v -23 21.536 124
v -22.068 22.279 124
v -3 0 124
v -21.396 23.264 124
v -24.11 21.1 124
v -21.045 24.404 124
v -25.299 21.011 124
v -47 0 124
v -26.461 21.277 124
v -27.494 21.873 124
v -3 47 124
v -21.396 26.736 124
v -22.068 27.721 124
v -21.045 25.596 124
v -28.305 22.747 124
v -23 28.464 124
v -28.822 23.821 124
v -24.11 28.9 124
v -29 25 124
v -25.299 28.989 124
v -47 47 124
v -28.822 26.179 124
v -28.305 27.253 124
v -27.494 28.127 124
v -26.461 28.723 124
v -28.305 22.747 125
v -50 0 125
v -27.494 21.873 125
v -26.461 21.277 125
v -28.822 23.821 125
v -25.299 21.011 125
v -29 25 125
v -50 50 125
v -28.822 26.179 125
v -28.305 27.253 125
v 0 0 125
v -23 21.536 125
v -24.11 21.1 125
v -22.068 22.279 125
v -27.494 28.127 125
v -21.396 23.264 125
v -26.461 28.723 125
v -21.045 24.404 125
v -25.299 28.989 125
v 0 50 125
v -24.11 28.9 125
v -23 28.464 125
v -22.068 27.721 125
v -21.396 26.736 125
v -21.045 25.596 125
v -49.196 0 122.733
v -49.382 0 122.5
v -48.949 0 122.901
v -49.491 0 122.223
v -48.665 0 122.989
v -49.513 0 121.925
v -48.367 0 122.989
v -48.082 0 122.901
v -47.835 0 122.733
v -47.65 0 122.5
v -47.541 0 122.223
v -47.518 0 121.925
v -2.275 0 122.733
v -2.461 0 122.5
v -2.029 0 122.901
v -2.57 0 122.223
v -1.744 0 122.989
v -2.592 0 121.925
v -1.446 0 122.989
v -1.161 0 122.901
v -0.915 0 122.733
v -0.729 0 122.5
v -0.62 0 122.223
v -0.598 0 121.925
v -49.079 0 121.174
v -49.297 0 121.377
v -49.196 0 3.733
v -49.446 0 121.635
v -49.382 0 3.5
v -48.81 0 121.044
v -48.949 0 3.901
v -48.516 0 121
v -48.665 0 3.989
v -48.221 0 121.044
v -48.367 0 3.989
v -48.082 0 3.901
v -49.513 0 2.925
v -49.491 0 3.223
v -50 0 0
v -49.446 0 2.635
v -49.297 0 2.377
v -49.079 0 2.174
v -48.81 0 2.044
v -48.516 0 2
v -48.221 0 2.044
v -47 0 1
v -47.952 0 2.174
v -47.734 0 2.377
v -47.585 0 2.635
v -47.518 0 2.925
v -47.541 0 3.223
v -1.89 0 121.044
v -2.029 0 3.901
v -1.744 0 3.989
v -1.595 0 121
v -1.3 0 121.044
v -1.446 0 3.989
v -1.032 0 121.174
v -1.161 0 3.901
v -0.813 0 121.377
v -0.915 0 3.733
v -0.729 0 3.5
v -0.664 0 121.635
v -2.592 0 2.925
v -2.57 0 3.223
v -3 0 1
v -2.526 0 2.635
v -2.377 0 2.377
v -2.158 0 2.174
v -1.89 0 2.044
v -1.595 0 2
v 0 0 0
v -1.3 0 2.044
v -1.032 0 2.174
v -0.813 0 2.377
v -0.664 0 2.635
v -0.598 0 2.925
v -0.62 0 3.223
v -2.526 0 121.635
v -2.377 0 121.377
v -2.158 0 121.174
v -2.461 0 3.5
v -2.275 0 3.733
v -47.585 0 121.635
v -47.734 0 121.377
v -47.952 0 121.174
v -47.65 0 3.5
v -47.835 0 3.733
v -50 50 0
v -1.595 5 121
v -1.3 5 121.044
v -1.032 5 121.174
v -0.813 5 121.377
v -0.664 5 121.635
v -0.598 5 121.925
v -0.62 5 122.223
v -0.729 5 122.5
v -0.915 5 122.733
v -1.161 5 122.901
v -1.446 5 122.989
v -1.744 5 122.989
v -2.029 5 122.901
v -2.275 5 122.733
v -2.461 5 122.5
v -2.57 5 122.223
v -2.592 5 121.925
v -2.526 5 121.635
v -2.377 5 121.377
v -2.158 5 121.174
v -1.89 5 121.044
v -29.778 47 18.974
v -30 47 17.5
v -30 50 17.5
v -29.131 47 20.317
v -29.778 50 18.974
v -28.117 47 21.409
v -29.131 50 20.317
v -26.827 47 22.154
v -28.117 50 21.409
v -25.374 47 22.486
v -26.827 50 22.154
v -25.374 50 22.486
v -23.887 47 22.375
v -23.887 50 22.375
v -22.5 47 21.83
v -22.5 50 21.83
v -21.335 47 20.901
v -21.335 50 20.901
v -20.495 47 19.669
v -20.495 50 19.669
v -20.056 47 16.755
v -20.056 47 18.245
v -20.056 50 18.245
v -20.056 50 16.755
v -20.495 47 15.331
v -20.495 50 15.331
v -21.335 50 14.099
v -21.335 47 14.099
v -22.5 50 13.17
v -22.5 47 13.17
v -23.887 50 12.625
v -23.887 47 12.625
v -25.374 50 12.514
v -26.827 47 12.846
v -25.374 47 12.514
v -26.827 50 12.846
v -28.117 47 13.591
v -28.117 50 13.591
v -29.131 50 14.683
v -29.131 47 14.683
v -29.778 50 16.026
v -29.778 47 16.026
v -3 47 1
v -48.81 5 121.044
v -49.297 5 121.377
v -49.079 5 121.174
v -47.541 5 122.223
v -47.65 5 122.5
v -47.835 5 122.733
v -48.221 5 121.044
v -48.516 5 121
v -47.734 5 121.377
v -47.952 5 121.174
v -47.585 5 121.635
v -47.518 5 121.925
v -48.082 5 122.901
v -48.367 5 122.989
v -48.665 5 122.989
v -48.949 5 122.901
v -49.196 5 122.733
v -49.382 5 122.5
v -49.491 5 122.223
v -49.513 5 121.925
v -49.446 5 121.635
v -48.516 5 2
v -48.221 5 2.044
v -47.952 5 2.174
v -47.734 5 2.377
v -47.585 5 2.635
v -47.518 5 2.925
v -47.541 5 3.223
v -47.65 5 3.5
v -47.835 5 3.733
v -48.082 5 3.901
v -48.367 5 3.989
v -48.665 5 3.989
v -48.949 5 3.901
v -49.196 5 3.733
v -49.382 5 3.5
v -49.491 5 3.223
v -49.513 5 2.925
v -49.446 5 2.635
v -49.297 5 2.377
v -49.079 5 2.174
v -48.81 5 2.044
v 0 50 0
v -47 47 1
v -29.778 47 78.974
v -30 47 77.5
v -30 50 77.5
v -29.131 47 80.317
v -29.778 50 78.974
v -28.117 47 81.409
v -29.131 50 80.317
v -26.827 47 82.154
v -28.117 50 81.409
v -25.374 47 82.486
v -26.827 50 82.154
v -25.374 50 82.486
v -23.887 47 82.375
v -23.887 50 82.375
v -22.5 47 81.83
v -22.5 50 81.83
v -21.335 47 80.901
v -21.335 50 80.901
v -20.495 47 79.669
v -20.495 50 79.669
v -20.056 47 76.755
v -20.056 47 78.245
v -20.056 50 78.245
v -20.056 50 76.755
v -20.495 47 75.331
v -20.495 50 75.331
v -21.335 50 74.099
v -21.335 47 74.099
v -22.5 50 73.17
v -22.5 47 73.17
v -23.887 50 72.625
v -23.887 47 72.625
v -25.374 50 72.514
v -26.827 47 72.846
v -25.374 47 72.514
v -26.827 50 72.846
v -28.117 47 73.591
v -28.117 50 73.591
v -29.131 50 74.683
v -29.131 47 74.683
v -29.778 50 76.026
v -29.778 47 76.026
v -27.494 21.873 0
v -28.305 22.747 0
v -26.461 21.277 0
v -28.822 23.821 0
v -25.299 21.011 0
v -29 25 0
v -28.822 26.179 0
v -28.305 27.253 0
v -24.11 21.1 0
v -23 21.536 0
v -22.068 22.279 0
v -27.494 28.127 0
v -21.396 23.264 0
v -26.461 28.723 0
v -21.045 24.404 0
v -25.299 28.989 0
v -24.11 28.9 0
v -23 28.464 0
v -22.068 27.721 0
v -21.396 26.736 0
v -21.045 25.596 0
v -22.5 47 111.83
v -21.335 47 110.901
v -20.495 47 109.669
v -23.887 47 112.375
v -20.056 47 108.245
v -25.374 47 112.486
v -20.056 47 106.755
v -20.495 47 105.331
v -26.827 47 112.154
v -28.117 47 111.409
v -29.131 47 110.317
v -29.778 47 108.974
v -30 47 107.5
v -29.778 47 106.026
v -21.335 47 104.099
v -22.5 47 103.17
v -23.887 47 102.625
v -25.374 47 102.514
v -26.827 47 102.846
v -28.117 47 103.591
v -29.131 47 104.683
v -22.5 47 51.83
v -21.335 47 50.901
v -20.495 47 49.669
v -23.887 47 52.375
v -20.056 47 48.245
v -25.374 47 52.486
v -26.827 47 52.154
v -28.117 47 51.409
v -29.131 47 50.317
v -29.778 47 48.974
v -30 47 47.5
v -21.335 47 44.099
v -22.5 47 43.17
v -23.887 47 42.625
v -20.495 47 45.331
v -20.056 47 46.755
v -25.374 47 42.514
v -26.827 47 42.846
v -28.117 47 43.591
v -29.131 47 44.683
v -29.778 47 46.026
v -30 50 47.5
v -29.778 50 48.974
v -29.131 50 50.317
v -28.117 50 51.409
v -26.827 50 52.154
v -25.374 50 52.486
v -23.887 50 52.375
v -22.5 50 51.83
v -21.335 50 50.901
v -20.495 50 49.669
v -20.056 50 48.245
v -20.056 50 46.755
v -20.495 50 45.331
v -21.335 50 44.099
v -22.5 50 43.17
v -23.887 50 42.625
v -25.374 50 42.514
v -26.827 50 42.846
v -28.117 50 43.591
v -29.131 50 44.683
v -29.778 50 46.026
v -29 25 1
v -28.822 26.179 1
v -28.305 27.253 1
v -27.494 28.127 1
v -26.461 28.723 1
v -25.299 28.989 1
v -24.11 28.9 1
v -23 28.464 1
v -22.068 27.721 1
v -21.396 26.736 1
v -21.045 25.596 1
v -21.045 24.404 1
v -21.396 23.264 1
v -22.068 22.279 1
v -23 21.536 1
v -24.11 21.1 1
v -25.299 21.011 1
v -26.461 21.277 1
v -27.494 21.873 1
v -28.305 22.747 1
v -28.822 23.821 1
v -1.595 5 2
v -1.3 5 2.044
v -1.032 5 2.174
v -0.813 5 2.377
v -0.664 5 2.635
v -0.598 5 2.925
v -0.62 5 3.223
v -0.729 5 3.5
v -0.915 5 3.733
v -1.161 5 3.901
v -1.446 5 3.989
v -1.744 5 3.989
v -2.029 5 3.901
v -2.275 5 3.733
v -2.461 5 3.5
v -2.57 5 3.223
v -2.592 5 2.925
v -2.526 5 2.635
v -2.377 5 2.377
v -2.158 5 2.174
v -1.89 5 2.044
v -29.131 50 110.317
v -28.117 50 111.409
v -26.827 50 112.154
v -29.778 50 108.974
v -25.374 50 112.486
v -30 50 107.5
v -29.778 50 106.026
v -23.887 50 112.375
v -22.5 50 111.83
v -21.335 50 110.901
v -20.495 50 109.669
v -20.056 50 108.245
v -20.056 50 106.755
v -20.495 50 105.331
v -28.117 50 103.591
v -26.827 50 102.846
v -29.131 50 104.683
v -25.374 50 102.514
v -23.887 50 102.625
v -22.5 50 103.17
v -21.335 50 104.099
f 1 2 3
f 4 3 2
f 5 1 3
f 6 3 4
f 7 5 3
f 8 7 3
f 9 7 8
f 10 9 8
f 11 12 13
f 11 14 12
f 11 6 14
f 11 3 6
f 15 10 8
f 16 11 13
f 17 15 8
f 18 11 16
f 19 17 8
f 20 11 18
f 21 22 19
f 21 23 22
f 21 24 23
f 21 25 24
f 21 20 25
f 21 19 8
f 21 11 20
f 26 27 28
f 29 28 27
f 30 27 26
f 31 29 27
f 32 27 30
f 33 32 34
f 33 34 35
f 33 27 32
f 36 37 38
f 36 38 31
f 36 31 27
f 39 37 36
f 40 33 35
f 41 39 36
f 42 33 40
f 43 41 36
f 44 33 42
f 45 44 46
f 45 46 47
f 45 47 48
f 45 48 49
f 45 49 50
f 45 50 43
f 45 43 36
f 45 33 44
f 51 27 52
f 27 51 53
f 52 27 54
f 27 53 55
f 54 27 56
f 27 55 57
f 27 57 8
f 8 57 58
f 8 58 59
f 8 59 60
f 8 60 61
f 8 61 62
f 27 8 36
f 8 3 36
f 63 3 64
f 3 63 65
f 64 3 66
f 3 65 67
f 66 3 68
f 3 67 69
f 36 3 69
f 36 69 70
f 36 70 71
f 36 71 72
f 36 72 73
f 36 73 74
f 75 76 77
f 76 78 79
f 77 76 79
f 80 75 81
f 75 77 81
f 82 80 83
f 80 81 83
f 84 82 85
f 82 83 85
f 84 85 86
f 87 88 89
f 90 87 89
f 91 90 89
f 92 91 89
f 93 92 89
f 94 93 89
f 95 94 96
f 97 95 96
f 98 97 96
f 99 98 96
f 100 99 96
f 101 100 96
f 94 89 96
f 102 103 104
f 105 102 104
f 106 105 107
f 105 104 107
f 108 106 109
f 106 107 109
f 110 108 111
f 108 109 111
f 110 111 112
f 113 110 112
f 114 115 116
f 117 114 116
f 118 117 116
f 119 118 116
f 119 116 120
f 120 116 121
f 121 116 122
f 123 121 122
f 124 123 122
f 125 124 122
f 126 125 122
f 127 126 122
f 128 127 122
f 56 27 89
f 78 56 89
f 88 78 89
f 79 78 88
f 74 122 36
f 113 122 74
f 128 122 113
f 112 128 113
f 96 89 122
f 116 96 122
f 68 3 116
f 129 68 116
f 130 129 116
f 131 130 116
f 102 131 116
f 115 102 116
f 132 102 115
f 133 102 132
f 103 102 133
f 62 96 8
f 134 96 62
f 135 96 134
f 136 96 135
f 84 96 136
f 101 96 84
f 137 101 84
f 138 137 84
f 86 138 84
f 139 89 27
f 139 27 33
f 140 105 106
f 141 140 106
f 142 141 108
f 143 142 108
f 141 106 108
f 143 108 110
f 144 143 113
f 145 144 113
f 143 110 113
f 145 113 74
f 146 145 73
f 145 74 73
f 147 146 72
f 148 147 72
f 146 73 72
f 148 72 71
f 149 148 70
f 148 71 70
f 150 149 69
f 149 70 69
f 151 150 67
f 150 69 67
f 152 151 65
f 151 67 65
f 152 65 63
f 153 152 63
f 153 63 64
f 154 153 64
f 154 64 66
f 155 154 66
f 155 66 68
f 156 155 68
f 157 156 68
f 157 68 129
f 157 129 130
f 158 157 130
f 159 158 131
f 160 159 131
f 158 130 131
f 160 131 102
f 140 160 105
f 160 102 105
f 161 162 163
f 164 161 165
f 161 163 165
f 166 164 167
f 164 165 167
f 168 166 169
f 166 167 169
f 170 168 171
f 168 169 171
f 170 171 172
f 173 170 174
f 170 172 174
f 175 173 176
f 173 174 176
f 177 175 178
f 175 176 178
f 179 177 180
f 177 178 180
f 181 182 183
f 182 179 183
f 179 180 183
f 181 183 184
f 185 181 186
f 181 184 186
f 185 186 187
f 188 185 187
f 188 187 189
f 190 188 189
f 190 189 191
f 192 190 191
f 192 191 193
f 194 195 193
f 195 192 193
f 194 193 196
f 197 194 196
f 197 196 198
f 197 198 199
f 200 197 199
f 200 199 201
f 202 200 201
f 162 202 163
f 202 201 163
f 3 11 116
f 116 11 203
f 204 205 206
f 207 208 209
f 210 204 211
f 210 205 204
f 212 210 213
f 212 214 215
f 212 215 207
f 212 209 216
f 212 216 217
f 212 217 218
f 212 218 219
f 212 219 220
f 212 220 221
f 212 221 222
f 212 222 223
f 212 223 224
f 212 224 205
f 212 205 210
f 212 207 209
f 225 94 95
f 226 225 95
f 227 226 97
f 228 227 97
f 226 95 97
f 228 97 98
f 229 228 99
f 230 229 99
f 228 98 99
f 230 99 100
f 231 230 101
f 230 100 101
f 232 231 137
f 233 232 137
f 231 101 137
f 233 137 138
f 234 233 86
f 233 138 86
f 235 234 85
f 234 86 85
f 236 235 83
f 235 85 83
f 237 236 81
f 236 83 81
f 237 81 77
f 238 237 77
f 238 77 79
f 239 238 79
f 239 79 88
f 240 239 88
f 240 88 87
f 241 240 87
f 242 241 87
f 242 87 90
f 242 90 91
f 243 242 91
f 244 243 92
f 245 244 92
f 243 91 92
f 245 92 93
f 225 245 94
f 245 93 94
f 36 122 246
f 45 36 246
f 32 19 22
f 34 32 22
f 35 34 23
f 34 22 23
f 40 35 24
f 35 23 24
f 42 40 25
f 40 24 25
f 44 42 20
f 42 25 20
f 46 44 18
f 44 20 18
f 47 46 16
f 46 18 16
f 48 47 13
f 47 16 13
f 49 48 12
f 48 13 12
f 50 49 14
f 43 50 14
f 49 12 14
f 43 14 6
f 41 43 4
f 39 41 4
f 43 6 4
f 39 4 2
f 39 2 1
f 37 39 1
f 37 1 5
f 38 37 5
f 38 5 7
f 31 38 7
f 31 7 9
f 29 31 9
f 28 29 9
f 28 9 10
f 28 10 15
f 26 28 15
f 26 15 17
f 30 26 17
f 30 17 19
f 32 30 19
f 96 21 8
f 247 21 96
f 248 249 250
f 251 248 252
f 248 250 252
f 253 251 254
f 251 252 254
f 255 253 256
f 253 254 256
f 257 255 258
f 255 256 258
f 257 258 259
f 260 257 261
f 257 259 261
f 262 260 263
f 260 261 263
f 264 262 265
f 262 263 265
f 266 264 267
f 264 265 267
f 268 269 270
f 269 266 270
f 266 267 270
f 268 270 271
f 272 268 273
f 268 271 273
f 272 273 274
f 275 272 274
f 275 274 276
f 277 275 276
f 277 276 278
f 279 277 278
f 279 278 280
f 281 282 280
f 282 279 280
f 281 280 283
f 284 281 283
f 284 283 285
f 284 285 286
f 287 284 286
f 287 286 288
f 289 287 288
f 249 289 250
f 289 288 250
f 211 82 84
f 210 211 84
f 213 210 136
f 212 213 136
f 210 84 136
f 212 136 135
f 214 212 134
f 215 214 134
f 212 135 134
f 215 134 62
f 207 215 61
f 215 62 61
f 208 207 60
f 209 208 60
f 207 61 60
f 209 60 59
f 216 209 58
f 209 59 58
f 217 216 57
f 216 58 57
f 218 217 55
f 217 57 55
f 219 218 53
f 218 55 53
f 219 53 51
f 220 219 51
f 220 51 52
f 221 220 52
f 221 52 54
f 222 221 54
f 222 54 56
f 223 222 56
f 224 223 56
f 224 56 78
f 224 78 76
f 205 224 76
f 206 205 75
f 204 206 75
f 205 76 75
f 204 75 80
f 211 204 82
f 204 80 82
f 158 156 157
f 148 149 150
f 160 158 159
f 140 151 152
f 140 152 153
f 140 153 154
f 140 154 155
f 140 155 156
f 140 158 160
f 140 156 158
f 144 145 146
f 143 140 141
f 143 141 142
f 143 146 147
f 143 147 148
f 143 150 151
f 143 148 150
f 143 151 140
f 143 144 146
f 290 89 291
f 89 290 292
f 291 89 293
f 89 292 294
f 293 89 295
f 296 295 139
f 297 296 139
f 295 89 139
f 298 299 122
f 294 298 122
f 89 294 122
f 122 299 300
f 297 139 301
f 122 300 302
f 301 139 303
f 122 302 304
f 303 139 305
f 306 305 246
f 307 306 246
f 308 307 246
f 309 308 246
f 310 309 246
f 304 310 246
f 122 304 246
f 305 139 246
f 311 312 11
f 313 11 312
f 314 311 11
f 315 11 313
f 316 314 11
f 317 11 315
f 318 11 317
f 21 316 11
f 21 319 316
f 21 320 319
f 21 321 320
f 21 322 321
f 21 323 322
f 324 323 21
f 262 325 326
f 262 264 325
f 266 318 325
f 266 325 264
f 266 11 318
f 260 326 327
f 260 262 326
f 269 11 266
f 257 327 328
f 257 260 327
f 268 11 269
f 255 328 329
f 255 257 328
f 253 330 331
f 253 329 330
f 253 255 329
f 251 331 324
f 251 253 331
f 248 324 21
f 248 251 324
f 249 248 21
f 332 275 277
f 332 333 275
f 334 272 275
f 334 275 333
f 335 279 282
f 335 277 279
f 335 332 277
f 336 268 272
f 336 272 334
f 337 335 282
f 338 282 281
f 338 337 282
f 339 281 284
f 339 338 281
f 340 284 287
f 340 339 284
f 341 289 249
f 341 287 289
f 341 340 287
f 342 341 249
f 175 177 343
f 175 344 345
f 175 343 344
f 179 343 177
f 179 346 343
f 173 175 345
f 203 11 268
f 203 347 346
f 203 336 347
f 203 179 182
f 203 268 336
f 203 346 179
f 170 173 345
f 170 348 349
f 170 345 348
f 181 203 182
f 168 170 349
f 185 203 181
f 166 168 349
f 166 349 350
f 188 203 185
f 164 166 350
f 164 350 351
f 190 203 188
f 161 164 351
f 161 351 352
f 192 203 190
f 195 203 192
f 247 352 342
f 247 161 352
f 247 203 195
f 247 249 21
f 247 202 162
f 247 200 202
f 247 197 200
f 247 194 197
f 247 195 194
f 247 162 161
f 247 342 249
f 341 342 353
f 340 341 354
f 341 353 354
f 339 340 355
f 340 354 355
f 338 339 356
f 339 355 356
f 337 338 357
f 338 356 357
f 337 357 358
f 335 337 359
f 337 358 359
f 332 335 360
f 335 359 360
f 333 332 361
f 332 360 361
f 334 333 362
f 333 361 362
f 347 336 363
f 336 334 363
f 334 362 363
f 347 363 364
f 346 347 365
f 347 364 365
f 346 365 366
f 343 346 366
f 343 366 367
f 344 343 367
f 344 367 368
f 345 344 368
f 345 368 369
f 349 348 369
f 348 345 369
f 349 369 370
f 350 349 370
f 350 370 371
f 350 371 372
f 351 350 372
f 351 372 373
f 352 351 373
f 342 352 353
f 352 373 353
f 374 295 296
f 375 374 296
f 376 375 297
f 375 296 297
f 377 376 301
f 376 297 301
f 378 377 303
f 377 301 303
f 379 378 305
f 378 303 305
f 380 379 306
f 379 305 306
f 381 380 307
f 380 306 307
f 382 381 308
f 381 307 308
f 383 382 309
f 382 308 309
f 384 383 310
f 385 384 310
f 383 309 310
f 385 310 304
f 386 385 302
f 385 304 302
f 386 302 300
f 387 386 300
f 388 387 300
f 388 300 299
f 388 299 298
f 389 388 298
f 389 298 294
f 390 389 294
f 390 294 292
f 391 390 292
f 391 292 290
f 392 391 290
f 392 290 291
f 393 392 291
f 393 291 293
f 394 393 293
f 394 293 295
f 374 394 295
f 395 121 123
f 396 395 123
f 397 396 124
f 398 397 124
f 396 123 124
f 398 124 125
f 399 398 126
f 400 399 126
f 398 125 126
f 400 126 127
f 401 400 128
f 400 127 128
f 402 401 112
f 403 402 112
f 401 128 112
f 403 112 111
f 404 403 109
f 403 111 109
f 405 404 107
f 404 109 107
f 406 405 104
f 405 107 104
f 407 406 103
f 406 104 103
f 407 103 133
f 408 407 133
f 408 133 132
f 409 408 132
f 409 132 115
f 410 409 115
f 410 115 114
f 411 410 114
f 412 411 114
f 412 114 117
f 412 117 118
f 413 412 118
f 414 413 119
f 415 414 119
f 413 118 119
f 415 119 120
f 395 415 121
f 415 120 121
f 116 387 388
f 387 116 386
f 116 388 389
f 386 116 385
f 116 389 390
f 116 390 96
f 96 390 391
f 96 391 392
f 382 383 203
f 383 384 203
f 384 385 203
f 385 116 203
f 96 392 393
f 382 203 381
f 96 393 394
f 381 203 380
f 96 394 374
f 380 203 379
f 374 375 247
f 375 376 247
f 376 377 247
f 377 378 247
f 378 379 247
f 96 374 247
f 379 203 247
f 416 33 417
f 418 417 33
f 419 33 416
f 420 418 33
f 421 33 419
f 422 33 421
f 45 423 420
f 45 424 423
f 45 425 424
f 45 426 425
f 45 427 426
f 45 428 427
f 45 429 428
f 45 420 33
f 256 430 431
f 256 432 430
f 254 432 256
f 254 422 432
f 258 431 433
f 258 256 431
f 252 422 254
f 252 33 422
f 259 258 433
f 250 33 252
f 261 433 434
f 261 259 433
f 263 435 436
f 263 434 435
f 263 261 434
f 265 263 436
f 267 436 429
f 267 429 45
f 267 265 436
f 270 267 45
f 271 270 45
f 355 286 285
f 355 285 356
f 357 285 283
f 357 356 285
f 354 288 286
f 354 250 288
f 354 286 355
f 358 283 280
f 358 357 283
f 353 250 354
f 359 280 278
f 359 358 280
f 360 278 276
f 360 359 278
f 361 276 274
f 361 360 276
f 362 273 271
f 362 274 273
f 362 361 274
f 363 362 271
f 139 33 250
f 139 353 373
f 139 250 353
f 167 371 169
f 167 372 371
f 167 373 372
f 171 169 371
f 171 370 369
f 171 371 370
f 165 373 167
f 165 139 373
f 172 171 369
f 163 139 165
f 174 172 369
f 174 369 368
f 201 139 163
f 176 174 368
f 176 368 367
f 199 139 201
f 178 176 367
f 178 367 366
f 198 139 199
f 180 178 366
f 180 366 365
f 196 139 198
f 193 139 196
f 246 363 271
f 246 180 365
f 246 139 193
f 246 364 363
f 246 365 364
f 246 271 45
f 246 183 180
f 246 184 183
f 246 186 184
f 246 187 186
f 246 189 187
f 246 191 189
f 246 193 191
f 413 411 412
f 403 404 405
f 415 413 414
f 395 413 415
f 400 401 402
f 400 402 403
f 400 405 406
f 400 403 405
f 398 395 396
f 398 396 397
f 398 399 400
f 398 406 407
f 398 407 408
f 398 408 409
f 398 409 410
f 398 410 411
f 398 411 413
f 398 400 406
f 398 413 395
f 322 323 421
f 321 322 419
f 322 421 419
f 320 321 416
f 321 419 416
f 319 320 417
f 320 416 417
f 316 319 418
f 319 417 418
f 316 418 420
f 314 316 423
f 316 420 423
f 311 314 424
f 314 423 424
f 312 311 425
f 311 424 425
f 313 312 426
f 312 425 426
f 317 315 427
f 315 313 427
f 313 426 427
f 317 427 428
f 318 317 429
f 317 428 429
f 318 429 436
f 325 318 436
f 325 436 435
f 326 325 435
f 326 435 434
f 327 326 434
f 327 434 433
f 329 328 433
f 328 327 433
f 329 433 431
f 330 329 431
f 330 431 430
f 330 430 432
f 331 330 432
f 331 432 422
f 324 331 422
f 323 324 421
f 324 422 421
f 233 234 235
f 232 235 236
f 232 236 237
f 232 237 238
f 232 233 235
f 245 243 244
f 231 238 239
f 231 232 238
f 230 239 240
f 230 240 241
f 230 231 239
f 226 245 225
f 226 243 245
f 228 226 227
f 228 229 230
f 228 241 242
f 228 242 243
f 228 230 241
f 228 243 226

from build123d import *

# Parameters (mm, degrees)
SKETCH1_W           = 50
SKETCH1_H           = 50
BOSS_EXTRUDE1_DEPTH = 125
SKETCH2_R           = 5
CUT_EXTRUDE1_DEPTH  = 145
SKETCH3_R           = 4
CUT_EXTRUDE2_DEPTH  = 145
CUT_EXTRUDE3_START  = -47
SKETCH4_W           = 44
SKETCH4_H           = 123
SKETCH4_R           = 5
CUT_EXTRUDE3_DEPTH  = 47
SKETCH5_R           = 1
CUT_EXTRUDE4_DEPTH  = 5


with BuildPart() as part:
    # Sketch1 → Boss-Extrude1 (new body)
    with BuildSketch(Plane.XY):
        with Locations((-25, 25)):
            Rectangle(SKETCH1_W, SKETCH1_H)
    extrude(amount=BOSS_EXTRUDE1_DEPTH)

    # Sketch2 → Cut-Extrude1 (cut)
    with BuildSketch(Plane(origin=(0, 50, 0), x_dir=(1, 0, 0), z_dir=(0, 1, 0))):
        with Locations(Location((-25, -17.5, 0), (0, 0, 180))):
            Circle(SKETCH2_R)
        with Locations(Location((-25, -47.5, 0), (0, 0, 180))):
            Circle(SKETCH2_R)
        with Locations(Location((-25, -77.5, 0), (0, 0, 180))):
            Circle(SKETCH2_R)
        with Locations(Location((-25, -107.5, 0), (0, 0, 180))):
            Circle(SKETCH2_R)
    extrude(amount=-CUT_EXTRUDE1_DEPTH, mode=Mode.SUBTRACT)

    # Sketch3 → Cut-Extrude2 (cut)
    with BuildSketch(Plane(origin=(0, 0, 0), x_dir=(-1, 0, 0), z_dir=(0, 0, -1))):
        with Locations((25, 25)):
            Circle(SKETCH3_R)
    extrude(amount=-CUT_EXTRUDE2_DEPTH, mode=Mode.SUBTRACT)

    # Sketch4 → Cut-Extrude3 (cut)
    with BuildSketch(Plane(origin=(0, 0, 0), x_dir=(-1, 0, 0), z_dir=(0, -1, 0)).offset(CUT_EXTRUDE3_START)):
        with Locations((25, -62.5)):
            Rectangle(SKETCH4_W, SKETCH4_H)
        with Locations((25, -47.5)):
            Circle(SKETCH4_R, mode=Mode.SUBTRACT)
        with Locations((25, -107.5)):
            Circle(SKETCH4_R, mode=Mode.SUBTRACT)
        with Locations((25, -77.5)):
            Circle(SKETCH4_R, mode=Mode.SUBTRACT)
        with Locations((25, -17.5)):
            Circle(SKETCH4_R, mode=Mode.SUBTRACT)
    extrude(amount=CUT_EXTRUDE3_DEPTH, mode=Mode.SUBTRACT)

    # Sketch5 → Cut-Extrude4 (cut)
    with BuildSketch(Plane(origin=(0, 0, 0), x_dir=(-1, 0, 0), z_dir=(0, -1, 0))):
        with Locations(Location((48.515610021, -122, 0), (0, 0, 90))):
            Circle(SKETCH5_R)
        with Locations(Location((1.594830842, -122, 0), (0, 0, 90))):
            Circle(SKETCH5_R)
        with Locations(Location((48.515610021, -3, 0), (0, 0, 90))):
            Circle(SKETCH5_R)
        with Locations(Location((1.594830842, -3, 0), (0, 0, 90))):
            Circle(SKETCH5_R)
    extrude(amount=-CUT_EXTRUDE4_DEPTH, mode=Mode.SUBTRACT)


solid = part.part
